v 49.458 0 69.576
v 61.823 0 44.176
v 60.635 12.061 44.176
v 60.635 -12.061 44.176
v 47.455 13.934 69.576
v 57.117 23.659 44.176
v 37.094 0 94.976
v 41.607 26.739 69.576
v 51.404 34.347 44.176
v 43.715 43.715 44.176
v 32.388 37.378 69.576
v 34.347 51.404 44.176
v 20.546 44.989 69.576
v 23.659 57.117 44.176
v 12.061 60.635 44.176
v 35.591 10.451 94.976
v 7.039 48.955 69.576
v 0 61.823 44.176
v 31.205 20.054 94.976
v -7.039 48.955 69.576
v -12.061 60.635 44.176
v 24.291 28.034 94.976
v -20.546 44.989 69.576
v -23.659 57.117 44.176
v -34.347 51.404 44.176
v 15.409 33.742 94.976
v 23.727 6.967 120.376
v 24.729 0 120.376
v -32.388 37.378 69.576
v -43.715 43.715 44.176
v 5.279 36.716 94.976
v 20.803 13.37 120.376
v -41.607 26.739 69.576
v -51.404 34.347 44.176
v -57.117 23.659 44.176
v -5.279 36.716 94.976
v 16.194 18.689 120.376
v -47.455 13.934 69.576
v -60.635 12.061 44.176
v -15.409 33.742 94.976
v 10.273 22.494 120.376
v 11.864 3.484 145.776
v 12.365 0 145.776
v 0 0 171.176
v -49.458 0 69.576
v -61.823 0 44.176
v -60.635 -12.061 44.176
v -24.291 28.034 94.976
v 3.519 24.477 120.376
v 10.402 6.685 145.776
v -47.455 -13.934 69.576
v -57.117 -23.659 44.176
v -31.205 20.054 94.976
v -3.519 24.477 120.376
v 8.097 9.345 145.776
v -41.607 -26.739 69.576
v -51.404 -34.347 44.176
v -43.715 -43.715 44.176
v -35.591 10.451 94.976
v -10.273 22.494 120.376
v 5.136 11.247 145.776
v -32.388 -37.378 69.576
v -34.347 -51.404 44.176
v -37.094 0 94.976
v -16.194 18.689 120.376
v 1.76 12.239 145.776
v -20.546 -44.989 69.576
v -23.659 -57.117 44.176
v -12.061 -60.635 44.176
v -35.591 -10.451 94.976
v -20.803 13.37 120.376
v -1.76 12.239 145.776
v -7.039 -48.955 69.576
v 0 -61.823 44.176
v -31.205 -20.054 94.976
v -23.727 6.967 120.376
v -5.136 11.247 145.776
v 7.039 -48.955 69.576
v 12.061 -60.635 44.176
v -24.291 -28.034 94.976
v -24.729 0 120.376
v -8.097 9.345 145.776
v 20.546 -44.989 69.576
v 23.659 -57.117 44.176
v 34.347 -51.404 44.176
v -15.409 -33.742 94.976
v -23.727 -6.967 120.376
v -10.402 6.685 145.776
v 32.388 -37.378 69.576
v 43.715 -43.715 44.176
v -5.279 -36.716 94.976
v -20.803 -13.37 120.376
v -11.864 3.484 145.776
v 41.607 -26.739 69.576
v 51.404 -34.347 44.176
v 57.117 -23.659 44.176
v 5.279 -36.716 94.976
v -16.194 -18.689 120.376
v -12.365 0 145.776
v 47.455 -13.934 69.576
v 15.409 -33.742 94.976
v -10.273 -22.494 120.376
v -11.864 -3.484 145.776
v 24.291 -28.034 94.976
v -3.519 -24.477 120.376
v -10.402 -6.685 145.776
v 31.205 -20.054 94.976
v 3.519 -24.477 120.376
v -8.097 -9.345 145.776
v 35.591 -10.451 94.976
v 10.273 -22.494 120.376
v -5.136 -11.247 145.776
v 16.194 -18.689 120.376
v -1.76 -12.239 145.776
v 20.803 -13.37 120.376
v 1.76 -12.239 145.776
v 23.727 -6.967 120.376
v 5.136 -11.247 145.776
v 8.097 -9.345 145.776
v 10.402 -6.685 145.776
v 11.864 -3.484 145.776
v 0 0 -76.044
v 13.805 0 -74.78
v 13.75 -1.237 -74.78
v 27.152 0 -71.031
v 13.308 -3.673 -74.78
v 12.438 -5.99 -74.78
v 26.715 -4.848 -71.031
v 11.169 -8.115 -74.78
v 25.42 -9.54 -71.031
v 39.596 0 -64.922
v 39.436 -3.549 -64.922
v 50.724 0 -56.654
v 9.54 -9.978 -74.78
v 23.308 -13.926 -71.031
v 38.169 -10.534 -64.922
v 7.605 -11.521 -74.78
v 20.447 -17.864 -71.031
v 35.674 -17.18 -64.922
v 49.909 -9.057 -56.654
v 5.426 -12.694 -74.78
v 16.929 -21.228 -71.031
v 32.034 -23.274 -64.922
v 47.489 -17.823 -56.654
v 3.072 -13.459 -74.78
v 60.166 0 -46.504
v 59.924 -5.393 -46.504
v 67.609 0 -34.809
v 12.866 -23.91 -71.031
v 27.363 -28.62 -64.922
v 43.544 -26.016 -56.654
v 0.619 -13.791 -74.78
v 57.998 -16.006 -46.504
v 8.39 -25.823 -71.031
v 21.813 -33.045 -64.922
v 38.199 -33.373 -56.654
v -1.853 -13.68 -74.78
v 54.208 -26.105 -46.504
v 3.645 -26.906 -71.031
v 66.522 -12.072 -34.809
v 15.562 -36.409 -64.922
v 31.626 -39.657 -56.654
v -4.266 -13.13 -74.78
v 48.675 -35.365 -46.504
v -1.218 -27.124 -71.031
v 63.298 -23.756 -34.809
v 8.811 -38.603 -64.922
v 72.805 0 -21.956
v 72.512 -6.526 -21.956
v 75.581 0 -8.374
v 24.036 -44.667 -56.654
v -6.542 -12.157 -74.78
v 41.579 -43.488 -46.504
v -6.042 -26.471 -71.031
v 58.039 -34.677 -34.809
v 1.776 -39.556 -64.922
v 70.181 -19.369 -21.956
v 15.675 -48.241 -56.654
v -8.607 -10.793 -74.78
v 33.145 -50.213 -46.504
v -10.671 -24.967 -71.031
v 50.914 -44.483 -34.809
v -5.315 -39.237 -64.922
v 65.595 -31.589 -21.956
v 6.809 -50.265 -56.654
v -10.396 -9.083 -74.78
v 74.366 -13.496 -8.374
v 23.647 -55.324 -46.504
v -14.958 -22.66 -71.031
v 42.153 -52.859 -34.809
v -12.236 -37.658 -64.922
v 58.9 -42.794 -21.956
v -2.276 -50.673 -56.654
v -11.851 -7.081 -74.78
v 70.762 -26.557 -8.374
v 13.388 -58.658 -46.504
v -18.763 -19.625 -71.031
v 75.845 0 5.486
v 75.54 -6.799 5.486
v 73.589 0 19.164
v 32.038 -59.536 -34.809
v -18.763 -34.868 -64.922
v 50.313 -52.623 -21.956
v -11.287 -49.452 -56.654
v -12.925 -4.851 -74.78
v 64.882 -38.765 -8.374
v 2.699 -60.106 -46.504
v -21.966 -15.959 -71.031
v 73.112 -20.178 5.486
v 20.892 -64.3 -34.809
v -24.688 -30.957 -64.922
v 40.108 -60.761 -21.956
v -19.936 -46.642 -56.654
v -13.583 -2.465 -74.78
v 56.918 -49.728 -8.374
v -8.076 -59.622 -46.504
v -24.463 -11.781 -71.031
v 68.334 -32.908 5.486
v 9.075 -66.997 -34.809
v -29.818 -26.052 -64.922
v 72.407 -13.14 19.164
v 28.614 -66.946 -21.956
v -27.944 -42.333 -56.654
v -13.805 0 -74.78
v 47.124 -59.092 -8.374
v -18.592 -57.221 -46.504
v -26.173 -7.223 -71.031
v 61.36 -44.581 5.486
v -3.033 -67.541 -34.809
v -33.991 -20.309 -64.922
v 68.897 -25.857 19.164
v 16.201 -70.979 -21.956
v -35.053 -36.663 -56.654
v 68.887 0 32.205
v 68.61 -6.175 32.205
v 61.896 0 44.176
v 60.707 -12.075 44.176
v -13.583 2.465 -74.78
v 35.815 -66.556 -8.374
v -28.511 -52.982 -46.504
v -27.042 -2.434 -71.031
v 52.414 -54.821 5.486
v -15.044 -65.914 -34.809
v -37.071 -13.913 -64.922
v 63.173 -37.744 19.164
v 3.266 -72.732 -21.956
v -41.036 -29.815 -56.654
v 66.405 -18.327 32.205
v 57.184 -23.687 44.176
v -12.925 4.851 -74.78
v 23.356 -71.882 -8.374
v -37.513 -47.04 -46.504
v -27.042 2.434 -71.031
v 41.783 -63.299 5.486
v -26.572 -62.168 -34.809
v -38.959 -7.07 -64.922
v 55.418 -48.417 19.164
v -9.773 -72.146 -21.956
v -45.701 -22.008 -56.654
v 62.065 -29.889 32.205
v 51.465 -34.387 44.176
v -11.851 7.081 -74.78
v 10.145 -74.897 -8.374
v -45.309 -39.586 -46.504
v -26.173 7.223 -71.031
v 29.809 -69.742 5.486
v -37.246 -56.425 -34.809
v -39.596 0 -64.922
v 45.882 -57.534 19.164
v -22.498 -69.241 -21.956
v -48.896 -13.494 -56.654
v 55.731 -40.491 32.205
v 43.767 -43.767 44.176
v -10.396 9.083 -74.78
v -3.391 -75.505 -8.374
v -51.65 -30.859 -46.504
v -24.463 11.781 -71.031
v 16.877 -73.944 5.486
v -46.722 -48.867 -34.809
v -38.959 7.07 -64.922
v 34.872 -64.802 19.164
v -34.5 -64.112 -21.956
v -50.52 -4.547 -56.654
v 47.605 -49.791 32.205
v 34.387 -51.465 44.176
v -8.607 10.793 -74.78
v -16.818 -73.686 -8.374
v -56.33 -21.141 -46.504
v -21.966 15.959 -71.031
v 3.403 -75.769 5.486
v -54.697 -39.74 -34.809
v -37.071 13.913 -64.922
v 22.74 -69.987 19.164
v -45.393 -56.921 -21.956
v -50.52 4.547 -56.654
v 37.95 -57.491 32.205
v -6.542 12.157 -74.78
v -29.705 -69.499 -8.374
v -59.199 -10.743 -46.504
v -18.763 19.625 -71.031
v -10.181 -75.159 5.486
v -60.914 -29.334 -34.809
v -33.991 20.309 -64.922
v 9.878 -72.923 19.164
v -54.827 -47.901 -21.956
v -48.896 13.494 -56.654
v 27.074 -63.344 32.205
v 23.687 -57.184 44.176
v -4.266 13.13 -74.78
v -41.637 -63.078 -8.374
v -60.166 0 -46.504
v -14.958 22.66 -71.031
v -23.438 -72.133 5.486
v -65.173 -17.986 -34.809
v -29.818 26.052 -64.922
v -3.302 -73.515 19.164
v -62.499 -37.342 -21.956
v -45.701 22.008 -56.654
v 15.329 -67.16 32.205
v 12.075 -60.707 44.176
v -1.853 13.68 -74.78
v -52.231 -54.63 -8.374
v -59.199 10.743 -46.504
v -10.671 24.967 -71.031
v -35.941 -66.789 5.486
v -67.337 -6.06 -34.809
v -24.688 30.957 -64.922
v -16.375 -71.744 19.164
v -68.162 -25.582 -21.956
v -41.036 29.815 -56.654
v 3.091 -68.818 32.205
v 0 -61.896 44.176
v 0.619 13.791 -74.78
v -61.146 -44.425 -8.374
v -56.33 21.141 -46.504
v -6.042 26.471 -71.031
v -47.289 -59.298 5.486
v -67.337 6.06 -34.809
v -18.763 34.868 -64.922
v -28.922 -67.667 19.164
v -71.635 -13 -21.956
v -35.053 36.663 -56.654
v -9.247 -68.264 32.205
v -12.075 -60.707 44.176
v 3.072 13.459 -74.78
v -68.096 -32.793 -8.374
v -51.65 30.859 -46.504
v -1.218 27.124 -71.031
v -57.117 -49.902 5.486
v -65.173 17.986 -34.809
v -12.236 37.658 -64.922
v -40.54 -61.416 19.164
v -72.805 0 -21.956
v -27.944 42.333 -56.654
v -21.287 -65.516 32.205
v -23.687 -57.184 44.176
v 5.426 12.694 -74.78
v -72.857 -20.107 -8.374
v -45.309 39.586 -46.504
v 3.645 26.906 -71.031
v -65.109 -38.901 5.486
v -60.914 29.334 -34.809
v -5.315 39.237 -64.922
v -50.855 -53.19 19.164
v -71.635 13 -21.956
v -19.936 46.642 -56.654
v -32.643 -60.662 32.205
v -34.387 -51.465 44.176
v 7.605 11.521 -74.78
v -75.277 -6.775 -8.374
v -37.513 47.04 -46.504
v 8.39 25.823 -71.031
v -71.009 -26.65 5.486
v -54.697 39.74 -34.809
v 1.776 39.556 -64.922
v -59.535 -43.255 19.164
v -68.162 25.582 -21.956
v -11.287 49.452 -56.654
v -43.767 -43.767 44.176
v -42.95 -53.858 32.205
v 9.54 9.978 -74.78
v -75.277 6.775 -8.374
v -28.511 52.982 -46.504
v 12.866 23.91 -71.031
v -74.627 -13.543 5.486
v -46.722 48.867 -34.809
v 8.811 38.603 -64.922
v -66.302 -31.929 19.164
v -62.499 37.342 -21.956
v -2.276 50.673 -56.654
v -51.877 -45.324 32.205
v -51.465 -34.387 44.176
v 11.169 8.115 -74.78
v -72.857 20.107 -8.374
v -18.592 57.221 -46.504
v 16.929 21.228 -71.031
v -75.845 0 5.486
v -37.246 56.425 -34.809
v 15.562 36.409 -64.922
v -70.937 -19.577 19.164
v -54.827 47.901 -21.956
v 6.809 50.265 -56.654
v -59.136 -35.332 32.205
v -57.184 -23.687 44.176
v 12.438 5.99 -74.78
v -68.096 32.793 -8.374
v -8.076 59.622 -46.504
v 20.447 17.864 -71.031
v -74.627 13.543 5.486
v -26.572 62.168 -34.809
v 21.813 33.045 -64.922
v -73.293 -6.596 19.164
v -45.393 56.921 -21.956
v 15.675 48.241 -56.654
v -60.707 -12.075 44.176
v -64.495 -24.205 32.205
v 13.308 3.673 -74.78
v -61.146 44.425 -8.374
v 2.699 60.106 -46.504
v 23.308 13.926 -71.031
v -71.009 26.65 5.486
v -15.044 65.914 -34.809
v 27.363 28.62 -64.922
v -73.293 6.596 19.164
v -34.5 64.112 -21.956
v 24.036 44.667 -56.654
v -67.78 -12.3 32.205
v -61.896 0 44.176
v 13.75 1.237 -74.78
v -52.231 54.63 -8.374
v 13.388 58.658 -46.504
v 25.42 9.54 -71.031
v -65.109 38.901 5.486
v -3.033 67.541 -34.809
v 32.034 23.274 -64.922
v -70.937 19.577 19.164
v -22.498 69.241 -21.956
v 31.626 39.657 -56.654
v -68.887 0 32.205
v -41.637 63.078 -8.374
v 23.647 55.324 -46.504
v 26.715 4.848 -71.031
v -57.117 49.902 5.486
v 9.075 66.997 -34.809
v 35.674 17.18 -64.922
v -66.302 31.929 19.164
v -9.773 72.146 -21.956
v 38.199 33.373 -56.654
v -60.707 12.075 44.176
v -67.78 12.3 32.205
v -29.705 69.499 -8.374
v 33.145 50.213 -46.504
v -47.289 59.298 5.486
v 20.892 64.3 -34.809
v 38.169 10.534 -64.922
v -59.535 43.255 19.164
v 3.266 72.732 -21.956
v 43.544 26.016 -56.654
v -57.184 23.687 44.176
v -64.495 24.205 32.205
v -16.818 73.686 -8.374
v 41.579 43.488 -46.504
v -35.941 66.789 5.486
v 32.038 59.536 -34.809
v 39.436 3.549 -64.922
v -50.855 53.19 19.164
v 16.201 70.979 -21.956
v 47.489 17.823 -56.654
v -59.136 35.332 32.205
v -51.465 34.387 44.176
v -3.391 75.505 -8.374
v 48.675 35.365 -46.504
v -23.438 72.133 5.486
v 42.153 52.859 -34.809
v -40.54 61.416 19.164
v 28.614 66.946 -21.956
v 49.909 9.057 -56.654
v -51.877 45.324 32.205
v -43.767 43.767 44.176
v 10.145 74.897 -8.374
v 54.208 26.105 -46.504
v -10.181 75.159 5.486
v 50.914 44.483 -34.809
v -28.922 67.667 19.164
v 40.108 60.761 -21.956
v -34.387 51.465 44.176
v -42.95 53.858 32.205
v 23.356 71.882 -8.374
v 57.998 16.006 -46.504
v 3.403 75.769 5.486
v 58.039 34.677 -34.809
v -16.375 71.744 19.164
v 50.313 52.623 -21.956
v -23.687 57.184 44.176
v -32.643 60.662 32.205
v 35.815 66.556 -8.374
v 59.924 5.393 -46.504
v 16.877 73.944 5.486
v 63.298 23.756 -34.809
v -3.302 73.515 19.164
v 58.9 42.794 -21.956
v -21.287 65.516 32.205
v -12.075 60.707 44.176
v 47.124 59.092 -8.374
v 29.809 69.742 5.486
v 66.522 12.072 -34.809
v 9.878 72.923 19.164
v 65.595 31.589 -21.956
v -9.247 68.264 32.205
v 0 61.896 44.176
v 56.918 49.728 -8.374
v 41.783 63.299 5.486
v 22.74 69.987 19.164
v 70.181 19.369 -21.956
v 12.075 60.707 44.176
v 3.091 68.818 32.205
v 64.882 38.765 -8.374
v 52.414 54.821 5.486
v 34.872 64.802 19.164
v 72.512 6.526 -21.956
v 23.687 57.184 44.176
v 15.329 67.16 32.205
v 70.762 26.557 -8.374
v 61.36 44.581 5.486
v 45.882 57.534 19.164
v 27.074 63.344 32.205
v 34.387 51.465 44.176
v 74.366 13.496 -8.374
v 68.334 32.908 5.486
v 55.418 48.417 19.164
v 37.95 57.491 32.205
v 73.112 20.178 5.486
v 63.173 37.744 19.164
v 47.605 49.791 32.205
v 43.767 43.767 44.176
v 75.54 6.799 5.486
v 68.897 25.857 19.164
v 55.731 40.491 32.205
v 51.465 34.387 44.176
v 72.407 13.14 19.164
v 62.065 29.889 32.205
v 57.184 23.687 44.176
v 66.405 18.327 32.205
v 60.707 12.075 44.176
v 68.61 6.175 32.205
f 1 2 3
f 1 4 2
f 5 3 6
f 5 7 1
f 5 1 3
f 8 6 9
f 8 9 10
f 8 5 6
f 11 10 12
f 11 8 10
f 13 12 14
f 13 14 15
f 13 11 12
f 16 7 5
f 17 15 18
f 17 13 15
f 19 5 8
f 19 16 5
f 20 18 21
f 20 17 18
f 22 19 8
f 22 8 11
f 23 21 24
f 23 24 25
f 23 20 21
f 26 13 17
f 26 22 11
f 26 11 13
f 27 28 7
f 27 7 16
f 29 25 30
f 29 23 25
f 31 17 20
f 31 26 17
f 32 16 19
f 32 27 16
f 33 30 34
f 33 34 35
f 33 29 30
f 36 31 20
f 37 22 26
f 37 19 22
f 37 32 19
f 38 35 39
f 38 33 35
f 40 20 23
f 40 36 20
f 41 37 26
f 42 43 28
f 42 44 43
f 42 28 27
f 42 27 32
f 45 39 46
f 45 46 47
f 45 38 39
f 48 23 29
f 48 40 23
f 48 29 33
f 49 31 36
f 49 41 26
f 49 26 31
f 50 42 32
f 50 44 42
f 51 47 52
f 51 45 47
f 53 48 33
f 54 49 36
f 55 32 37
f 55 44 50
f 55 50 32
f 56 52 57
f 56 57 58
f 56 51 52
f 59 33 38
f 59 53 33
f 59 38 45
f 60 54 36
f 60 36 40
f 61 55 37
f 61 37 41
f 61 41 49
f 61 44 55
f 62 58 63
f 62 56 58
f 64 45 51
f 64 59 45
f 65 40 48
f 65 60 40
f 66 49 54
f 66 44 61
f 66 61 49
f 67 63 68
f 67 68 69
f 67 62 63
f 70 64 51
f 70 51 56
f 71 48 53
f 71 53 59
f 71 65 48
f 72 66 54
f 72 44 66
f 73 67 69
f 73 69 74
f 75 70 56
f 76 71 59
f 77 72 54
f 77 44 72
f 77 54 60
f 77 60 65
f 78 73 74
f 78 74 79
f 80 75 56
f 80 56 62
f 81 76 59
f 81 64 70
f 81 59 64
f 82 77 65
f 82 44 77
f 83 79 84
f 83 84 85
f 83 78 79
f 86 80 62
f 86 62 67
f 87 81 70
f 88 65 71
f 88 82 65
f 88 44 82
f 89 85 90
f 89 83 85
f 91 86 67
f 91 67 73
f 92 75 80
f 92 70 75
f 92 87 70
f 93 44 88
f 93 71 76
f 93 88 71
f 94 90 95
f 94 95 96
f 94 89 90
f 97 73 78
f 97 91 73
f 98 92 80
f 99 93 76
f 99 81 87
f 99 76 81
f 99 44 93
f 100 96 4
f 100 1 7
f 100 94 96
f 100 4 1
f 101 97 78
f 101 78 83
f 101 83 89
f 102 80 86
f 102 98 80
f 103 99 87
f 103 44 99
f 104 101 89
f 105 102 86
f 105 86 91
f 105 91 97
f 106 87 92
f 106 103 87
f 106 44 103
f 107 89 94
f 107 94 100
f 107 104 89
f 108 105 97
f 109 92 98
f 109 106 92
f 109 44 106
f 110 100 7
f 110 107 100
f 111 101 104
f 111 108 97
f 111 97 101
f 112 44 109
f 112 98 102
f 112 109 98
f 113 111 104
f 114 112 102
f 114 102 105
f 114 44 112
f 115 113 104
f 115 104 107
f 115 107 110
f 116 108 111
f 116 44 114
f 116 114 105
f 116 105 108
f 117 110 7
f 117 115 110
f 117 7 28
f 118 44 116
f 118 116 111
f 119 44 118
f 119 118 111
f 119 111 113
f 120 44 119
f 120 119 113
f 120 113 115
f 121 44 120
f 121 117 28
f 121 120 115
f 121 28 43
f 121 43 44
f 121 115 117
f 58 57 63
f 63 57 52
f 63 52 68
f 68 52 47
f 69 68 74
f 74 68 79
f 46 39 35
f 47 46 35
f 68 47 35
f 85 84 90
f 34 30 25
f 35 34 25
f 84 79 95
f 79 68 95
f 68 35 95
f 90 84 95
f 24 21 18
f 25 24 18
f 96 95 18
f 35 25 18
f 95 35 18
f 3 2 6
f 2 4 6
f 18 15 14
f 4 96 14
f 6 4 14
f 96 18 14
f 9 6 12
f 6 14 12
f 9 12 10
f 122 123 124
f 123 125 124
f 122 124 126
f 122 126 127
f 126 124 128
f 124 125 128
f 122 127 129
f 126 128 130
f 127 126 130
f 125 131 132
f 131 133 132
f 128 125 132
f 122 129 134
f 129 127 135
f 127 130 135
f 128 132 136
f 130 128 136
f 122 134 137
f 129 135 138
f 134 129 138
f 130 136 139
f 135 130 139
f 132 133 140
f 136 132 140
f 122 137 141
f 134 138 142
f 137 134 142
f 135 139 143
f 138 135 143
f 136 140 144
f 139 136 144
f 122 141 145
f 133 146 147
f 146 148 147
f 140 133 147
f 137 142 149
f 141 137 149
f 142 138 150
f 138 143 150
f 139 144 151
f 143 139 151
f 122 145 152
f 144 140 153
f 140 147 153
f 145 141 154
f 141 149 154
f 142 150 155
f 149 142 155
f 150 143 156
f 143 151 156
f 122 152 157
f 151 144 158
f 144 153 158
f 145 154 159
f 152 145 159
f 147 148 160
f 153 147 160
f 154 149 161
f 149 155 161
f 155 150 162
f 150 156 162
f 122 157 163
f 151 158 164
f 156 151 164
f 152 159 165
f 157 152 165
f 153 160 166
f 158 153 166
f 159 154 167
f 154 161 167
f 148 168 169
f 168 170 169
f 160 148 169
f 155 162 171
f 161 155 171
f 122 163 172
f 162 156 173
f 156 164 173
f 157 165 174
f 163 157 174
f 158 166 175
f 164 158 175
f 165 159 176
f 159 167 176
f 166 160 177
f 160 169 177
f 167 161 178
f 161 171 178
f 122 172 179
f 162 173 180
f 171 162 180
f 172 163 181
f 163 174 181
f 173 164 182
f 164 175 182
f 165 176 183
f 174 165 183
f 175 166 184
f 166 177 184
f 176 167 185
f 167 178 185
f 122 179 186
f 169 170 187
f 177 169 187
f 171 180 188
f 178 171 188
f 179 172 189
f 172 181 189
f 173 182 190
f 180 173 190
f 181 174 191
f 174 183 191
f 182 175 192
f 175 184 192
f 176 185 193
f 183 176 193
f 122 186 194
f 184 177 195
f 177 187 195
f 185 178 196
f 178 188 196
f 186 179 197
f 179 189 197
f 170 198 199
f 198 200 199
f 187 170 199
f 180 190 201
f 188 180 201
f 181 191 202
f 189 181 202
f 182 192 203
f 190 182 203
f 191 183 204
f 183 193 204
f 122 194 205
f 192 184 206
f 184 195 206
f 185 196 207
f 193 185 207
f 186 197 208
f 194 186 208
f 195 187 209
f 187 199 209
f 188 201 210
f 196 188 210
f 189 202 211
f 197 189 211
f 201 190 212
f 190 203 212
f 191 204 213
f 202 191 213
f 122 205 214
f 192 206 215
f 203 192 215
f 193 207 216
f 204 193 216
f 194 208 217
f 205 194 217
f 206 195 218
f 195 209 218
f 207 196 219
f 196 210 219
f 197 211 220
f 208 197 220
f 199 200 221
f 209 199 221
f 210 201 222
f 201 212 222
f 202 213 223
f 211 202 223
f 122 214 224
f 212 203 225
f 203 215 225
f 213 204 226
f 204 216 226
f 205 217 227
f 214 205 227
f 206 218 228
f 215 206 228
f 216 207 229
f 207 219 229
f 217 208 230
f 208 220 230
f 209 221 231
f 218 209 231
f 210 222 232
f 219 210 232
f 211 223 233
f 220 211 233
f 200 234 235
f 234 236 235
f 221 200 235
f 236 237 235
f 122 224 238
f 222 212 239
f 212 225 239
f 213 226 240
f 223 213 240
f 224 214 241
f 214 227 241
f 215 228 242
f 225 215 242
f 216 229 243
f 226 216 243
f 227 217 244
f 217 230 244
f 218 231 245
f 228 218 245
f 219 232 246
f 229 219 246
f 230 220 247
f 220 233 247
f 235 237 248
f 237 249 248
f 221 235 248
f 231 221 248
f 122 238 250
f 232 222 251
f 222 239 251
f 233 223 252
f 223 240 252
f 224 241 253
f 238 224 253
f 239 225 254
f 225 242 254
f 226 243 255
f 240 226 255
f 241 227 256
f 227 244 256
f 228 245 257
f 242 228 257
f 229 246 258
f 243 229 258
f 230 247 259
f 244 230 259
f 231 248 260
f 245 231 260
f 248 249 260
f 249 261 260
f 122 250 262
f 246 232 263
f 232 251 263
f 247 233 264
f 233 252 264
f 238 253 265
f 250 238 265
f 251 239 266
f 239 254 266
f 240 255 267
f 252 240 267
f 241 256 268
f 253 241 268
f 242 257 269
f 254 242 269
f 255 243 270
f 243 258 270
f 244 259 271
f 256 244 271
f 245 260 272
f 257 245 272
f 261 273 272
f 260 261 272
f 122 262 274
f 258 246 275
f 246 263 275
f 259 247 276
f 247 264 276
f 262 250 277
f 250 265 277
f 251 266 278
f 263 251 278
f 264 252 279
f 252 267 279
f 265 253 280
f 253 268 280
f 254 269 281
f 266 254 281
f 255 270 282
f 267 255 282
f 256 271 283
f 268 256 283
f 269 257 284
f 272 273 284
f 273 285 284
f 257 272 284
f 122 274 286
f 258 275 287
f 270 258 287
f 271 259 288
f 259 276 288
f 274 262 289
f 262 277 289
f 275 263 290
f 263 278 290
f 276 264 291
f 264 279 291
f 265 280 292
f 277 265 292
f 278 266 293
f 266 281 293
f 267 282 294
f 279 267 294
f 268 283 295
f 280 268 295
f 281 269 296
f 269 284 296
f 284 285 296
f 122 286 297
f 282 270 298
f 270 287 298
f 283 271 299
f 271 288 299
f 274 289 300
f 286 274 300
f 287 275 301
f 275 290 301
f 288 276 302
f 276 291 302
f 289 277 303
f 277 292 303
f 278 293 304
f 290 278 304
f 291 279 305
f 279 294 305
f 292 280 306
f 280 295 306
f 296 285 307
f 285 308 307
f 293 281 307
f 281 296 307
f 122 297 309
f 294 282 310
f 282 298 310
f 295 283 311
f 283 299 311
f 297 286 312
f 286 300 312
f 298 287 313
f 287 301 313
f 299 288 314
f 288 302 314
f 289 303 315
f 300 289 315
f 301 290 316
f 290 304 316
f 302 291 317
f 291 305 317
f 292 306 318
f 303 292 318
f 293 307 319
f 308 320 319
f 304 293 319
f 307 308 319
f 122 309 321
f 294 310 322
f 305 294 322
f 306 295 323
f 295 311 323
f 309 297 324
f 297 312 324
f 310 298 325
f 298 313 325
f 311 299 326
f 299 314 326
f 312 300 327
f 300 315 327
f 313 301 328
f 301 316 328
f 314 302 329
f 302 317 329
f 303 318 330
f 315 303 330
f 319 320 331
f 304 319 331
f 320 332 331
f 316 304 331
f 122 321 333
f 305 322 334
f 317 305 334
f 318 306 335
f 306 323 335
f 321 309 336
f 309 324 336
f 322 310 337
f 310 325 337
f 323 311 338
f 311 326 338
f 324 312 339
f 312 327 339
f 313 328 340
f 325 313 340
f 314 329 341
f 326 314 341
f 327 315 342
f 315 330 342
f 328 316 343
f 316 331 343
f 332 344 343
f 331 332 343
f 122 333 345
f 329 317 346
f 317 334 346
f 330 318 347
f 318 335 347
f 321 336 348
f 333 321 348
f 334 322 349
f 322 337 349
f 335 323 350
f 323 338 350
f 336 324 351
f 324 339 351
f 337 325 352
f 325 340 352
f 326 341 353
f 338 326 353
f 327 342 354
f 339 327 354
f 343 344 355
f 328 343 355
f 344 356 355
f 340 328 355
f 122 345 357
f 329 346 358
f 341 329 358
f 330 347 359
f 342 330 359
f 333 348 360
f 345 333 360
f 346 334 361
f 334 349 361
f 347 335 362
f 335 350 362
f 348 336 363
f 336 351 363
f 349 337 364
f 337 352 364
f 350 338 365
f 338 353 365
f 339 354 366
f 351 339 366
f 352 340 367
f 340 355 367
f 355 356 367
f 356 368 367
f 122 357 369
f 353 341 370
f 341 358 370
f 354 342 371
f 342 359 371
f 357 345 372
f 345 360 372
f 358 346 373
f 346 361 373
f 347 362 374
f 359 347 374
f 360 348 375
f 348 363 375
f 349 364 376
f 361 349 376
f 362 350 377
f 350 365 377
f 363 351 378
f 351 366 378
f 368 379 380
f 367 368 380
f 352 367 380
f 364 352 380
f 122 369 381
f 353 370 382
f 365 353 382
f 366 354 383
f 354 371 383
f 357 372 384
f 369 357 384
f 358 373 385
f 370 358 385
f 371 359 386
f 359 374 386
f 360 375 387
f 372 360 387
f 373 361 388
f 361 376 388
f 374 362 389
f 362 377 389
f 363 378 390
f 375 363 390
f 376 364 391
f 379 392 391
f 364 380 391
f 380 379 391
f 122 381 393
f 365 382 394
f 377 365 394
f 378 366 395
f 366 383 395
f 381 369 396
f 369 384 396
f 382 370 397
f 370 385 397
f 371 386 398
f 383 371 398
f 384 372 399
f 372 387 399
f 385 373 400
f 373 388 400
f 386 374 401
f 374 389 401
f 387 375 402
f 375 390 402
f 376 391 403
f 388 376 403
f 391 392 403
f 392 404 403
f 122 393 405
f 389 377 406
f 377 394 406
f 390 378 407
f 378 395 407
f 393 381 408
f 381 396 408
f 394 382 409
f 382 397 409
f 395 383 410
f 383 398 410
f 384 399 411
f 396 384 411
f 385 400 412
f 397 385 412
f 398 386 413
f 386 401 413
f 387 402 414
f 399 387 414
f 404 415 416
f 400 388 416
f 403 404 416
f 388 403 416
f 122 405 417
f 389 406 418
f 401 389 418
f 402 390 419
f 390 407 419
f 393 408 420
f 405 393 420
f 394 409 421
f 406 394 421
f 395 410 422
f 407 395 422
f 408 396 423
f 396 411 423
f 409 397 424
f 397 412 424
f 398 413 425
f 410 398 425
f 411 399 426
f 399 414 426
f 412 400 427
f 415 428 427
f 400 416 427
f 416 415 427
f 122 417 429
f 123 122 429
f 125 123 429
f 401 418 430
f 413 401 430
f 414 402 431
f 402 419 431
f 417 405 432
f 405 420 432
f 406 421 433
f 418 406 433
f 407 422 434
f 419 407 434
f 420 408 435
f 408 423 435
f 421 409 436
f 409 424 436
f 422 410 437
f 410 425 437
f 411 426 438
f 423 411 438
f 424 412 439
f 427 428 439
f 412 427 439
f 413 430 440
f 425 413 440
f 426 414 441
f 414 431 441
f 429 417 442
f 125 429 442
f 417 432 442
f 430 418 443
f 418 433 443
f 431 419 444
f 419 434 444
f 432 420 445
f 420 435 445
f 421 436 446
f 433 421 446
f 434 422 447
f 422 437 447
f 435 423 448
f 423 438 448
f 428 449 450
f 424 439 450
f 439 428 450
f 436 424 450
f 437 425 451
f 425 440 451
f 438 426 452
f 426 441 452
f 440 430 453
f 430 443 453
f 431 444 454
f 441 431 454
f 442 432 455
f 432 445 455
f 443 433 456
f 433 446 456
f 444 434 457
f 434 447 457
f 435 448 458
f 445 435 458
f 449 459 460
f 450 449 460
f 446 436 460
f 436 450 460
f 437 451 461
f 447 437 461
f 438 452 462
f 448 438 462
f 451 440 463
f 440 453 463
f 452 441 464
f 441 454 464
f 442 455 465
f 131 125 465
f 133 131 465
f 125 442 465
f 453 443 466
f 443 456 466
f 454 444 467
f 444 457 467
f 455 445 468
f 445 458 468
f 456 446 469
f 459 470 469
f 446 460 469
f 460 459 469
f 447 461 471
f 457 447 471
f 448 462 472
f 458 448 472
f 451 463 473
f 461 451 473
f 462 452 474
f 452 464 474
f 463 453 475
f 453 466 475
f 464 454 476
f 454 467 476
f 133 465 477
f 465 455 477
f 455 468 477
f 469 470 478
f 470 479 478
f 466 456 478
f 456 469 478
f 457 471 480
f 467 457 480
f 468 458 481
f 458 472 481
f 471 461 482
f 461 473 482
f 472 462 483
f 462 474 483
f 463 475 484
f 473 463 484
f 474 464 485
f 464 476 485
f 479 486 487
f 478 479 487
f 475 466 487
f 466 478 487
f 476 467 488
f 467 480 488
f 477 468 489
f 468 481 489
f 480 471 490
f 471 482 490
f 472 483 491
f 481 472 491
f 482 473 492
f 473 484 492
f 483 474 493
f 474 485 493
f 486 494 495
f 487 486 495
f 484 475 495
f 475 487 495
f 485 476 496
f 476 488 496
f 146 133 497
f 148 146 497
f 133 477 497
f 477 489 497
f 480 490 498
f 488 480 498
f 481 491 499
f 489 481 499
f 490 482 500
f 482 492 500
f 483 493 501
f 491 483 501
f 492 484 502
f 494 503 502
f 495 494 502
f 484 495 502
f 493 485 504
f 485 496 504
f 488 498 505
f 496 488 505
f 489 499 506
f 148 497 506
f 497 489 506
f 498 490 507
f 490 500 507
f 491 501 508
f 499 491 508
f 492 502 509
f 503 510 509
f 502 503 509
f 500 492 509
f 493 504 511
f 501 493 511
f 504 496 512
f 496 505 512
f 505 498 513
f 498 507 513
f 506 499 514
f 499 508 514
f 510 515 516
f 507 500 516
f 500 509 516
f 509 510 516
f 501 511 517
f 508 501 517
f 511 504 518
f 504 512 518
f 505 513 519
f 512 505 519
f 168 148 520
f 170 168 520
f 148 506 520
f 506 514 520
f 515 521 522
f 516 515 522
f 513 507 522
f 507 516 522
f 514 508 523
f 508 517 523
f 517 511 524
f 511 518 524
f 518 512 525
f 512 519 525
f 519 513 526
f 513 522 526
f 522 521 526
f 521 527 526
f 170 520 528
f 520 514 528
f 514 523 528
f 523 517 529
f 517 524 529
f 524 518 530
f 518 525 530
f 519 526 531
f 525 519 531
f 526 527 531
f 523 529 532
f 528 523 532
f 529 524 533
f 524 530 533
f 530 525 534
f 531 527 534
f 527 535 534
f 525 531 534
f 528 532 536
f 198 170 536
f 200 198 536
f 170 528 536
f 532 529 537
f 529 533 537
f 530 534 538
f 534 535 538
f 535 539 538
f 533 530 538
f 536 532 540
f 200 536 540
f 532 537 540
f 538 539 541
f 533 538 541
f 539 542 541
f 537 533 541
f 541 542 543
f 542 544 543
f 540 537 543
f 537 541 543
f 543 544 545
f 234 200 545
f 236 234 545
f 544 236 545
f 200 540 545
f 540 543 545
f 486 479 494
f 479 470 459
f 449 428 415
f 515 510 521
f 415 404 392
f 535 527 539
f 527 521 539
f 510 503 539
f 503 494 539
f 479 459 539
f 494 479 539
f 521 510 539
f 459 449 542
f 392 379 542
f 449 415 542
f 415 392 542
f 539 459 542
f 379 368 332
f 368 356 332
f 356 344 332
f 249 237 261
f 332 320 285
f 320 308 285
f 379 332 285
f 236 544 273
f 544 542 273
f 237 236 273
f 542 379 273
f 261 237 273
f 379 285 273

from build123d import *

# Parameters (mm, degrees)
F2_W     = 152.056925
F2_H     = 32.610714
F3_DEPTH = 63.5
F4_R     = 61.822919


with BuildPart() as f1:
    # F0 (on Front) → F1 (revolve)
    with BuildSketch(Plane.XZ):
        with BuildLine():
            Line((0, 76.043595), (0, -76.043595))
            ThreePointArc((0, -76.043595), (76.043595, 0), (0, 76.043595))
        make_face()
    revolve(axis=Axis((0, 0, 0), (0, 0, -1)))

    # F2 (on Front) → F3 (cut, symmetric)
    with BuildSketch(Plane.XZ):
        with Locations((-0.75839, 60.481496)):
            Rectangle(F2_W, F2_H)
    extrude(amount=F3_DEPTH, both=True, mode=Mode.SUBTRACT)


with BuildPart() as f8:
    # F4 (on face) → F8 section 0
    with BuildSketch(Plane.XY.offset(44.176139), mode=Mode.PRIVATE) as f8_s0:
        Circle(F4_R)
    loft([f8_s0.sketch, Vertex(0, 0, 171.176139)])


solid = Compound([f1.part, f8.part])
